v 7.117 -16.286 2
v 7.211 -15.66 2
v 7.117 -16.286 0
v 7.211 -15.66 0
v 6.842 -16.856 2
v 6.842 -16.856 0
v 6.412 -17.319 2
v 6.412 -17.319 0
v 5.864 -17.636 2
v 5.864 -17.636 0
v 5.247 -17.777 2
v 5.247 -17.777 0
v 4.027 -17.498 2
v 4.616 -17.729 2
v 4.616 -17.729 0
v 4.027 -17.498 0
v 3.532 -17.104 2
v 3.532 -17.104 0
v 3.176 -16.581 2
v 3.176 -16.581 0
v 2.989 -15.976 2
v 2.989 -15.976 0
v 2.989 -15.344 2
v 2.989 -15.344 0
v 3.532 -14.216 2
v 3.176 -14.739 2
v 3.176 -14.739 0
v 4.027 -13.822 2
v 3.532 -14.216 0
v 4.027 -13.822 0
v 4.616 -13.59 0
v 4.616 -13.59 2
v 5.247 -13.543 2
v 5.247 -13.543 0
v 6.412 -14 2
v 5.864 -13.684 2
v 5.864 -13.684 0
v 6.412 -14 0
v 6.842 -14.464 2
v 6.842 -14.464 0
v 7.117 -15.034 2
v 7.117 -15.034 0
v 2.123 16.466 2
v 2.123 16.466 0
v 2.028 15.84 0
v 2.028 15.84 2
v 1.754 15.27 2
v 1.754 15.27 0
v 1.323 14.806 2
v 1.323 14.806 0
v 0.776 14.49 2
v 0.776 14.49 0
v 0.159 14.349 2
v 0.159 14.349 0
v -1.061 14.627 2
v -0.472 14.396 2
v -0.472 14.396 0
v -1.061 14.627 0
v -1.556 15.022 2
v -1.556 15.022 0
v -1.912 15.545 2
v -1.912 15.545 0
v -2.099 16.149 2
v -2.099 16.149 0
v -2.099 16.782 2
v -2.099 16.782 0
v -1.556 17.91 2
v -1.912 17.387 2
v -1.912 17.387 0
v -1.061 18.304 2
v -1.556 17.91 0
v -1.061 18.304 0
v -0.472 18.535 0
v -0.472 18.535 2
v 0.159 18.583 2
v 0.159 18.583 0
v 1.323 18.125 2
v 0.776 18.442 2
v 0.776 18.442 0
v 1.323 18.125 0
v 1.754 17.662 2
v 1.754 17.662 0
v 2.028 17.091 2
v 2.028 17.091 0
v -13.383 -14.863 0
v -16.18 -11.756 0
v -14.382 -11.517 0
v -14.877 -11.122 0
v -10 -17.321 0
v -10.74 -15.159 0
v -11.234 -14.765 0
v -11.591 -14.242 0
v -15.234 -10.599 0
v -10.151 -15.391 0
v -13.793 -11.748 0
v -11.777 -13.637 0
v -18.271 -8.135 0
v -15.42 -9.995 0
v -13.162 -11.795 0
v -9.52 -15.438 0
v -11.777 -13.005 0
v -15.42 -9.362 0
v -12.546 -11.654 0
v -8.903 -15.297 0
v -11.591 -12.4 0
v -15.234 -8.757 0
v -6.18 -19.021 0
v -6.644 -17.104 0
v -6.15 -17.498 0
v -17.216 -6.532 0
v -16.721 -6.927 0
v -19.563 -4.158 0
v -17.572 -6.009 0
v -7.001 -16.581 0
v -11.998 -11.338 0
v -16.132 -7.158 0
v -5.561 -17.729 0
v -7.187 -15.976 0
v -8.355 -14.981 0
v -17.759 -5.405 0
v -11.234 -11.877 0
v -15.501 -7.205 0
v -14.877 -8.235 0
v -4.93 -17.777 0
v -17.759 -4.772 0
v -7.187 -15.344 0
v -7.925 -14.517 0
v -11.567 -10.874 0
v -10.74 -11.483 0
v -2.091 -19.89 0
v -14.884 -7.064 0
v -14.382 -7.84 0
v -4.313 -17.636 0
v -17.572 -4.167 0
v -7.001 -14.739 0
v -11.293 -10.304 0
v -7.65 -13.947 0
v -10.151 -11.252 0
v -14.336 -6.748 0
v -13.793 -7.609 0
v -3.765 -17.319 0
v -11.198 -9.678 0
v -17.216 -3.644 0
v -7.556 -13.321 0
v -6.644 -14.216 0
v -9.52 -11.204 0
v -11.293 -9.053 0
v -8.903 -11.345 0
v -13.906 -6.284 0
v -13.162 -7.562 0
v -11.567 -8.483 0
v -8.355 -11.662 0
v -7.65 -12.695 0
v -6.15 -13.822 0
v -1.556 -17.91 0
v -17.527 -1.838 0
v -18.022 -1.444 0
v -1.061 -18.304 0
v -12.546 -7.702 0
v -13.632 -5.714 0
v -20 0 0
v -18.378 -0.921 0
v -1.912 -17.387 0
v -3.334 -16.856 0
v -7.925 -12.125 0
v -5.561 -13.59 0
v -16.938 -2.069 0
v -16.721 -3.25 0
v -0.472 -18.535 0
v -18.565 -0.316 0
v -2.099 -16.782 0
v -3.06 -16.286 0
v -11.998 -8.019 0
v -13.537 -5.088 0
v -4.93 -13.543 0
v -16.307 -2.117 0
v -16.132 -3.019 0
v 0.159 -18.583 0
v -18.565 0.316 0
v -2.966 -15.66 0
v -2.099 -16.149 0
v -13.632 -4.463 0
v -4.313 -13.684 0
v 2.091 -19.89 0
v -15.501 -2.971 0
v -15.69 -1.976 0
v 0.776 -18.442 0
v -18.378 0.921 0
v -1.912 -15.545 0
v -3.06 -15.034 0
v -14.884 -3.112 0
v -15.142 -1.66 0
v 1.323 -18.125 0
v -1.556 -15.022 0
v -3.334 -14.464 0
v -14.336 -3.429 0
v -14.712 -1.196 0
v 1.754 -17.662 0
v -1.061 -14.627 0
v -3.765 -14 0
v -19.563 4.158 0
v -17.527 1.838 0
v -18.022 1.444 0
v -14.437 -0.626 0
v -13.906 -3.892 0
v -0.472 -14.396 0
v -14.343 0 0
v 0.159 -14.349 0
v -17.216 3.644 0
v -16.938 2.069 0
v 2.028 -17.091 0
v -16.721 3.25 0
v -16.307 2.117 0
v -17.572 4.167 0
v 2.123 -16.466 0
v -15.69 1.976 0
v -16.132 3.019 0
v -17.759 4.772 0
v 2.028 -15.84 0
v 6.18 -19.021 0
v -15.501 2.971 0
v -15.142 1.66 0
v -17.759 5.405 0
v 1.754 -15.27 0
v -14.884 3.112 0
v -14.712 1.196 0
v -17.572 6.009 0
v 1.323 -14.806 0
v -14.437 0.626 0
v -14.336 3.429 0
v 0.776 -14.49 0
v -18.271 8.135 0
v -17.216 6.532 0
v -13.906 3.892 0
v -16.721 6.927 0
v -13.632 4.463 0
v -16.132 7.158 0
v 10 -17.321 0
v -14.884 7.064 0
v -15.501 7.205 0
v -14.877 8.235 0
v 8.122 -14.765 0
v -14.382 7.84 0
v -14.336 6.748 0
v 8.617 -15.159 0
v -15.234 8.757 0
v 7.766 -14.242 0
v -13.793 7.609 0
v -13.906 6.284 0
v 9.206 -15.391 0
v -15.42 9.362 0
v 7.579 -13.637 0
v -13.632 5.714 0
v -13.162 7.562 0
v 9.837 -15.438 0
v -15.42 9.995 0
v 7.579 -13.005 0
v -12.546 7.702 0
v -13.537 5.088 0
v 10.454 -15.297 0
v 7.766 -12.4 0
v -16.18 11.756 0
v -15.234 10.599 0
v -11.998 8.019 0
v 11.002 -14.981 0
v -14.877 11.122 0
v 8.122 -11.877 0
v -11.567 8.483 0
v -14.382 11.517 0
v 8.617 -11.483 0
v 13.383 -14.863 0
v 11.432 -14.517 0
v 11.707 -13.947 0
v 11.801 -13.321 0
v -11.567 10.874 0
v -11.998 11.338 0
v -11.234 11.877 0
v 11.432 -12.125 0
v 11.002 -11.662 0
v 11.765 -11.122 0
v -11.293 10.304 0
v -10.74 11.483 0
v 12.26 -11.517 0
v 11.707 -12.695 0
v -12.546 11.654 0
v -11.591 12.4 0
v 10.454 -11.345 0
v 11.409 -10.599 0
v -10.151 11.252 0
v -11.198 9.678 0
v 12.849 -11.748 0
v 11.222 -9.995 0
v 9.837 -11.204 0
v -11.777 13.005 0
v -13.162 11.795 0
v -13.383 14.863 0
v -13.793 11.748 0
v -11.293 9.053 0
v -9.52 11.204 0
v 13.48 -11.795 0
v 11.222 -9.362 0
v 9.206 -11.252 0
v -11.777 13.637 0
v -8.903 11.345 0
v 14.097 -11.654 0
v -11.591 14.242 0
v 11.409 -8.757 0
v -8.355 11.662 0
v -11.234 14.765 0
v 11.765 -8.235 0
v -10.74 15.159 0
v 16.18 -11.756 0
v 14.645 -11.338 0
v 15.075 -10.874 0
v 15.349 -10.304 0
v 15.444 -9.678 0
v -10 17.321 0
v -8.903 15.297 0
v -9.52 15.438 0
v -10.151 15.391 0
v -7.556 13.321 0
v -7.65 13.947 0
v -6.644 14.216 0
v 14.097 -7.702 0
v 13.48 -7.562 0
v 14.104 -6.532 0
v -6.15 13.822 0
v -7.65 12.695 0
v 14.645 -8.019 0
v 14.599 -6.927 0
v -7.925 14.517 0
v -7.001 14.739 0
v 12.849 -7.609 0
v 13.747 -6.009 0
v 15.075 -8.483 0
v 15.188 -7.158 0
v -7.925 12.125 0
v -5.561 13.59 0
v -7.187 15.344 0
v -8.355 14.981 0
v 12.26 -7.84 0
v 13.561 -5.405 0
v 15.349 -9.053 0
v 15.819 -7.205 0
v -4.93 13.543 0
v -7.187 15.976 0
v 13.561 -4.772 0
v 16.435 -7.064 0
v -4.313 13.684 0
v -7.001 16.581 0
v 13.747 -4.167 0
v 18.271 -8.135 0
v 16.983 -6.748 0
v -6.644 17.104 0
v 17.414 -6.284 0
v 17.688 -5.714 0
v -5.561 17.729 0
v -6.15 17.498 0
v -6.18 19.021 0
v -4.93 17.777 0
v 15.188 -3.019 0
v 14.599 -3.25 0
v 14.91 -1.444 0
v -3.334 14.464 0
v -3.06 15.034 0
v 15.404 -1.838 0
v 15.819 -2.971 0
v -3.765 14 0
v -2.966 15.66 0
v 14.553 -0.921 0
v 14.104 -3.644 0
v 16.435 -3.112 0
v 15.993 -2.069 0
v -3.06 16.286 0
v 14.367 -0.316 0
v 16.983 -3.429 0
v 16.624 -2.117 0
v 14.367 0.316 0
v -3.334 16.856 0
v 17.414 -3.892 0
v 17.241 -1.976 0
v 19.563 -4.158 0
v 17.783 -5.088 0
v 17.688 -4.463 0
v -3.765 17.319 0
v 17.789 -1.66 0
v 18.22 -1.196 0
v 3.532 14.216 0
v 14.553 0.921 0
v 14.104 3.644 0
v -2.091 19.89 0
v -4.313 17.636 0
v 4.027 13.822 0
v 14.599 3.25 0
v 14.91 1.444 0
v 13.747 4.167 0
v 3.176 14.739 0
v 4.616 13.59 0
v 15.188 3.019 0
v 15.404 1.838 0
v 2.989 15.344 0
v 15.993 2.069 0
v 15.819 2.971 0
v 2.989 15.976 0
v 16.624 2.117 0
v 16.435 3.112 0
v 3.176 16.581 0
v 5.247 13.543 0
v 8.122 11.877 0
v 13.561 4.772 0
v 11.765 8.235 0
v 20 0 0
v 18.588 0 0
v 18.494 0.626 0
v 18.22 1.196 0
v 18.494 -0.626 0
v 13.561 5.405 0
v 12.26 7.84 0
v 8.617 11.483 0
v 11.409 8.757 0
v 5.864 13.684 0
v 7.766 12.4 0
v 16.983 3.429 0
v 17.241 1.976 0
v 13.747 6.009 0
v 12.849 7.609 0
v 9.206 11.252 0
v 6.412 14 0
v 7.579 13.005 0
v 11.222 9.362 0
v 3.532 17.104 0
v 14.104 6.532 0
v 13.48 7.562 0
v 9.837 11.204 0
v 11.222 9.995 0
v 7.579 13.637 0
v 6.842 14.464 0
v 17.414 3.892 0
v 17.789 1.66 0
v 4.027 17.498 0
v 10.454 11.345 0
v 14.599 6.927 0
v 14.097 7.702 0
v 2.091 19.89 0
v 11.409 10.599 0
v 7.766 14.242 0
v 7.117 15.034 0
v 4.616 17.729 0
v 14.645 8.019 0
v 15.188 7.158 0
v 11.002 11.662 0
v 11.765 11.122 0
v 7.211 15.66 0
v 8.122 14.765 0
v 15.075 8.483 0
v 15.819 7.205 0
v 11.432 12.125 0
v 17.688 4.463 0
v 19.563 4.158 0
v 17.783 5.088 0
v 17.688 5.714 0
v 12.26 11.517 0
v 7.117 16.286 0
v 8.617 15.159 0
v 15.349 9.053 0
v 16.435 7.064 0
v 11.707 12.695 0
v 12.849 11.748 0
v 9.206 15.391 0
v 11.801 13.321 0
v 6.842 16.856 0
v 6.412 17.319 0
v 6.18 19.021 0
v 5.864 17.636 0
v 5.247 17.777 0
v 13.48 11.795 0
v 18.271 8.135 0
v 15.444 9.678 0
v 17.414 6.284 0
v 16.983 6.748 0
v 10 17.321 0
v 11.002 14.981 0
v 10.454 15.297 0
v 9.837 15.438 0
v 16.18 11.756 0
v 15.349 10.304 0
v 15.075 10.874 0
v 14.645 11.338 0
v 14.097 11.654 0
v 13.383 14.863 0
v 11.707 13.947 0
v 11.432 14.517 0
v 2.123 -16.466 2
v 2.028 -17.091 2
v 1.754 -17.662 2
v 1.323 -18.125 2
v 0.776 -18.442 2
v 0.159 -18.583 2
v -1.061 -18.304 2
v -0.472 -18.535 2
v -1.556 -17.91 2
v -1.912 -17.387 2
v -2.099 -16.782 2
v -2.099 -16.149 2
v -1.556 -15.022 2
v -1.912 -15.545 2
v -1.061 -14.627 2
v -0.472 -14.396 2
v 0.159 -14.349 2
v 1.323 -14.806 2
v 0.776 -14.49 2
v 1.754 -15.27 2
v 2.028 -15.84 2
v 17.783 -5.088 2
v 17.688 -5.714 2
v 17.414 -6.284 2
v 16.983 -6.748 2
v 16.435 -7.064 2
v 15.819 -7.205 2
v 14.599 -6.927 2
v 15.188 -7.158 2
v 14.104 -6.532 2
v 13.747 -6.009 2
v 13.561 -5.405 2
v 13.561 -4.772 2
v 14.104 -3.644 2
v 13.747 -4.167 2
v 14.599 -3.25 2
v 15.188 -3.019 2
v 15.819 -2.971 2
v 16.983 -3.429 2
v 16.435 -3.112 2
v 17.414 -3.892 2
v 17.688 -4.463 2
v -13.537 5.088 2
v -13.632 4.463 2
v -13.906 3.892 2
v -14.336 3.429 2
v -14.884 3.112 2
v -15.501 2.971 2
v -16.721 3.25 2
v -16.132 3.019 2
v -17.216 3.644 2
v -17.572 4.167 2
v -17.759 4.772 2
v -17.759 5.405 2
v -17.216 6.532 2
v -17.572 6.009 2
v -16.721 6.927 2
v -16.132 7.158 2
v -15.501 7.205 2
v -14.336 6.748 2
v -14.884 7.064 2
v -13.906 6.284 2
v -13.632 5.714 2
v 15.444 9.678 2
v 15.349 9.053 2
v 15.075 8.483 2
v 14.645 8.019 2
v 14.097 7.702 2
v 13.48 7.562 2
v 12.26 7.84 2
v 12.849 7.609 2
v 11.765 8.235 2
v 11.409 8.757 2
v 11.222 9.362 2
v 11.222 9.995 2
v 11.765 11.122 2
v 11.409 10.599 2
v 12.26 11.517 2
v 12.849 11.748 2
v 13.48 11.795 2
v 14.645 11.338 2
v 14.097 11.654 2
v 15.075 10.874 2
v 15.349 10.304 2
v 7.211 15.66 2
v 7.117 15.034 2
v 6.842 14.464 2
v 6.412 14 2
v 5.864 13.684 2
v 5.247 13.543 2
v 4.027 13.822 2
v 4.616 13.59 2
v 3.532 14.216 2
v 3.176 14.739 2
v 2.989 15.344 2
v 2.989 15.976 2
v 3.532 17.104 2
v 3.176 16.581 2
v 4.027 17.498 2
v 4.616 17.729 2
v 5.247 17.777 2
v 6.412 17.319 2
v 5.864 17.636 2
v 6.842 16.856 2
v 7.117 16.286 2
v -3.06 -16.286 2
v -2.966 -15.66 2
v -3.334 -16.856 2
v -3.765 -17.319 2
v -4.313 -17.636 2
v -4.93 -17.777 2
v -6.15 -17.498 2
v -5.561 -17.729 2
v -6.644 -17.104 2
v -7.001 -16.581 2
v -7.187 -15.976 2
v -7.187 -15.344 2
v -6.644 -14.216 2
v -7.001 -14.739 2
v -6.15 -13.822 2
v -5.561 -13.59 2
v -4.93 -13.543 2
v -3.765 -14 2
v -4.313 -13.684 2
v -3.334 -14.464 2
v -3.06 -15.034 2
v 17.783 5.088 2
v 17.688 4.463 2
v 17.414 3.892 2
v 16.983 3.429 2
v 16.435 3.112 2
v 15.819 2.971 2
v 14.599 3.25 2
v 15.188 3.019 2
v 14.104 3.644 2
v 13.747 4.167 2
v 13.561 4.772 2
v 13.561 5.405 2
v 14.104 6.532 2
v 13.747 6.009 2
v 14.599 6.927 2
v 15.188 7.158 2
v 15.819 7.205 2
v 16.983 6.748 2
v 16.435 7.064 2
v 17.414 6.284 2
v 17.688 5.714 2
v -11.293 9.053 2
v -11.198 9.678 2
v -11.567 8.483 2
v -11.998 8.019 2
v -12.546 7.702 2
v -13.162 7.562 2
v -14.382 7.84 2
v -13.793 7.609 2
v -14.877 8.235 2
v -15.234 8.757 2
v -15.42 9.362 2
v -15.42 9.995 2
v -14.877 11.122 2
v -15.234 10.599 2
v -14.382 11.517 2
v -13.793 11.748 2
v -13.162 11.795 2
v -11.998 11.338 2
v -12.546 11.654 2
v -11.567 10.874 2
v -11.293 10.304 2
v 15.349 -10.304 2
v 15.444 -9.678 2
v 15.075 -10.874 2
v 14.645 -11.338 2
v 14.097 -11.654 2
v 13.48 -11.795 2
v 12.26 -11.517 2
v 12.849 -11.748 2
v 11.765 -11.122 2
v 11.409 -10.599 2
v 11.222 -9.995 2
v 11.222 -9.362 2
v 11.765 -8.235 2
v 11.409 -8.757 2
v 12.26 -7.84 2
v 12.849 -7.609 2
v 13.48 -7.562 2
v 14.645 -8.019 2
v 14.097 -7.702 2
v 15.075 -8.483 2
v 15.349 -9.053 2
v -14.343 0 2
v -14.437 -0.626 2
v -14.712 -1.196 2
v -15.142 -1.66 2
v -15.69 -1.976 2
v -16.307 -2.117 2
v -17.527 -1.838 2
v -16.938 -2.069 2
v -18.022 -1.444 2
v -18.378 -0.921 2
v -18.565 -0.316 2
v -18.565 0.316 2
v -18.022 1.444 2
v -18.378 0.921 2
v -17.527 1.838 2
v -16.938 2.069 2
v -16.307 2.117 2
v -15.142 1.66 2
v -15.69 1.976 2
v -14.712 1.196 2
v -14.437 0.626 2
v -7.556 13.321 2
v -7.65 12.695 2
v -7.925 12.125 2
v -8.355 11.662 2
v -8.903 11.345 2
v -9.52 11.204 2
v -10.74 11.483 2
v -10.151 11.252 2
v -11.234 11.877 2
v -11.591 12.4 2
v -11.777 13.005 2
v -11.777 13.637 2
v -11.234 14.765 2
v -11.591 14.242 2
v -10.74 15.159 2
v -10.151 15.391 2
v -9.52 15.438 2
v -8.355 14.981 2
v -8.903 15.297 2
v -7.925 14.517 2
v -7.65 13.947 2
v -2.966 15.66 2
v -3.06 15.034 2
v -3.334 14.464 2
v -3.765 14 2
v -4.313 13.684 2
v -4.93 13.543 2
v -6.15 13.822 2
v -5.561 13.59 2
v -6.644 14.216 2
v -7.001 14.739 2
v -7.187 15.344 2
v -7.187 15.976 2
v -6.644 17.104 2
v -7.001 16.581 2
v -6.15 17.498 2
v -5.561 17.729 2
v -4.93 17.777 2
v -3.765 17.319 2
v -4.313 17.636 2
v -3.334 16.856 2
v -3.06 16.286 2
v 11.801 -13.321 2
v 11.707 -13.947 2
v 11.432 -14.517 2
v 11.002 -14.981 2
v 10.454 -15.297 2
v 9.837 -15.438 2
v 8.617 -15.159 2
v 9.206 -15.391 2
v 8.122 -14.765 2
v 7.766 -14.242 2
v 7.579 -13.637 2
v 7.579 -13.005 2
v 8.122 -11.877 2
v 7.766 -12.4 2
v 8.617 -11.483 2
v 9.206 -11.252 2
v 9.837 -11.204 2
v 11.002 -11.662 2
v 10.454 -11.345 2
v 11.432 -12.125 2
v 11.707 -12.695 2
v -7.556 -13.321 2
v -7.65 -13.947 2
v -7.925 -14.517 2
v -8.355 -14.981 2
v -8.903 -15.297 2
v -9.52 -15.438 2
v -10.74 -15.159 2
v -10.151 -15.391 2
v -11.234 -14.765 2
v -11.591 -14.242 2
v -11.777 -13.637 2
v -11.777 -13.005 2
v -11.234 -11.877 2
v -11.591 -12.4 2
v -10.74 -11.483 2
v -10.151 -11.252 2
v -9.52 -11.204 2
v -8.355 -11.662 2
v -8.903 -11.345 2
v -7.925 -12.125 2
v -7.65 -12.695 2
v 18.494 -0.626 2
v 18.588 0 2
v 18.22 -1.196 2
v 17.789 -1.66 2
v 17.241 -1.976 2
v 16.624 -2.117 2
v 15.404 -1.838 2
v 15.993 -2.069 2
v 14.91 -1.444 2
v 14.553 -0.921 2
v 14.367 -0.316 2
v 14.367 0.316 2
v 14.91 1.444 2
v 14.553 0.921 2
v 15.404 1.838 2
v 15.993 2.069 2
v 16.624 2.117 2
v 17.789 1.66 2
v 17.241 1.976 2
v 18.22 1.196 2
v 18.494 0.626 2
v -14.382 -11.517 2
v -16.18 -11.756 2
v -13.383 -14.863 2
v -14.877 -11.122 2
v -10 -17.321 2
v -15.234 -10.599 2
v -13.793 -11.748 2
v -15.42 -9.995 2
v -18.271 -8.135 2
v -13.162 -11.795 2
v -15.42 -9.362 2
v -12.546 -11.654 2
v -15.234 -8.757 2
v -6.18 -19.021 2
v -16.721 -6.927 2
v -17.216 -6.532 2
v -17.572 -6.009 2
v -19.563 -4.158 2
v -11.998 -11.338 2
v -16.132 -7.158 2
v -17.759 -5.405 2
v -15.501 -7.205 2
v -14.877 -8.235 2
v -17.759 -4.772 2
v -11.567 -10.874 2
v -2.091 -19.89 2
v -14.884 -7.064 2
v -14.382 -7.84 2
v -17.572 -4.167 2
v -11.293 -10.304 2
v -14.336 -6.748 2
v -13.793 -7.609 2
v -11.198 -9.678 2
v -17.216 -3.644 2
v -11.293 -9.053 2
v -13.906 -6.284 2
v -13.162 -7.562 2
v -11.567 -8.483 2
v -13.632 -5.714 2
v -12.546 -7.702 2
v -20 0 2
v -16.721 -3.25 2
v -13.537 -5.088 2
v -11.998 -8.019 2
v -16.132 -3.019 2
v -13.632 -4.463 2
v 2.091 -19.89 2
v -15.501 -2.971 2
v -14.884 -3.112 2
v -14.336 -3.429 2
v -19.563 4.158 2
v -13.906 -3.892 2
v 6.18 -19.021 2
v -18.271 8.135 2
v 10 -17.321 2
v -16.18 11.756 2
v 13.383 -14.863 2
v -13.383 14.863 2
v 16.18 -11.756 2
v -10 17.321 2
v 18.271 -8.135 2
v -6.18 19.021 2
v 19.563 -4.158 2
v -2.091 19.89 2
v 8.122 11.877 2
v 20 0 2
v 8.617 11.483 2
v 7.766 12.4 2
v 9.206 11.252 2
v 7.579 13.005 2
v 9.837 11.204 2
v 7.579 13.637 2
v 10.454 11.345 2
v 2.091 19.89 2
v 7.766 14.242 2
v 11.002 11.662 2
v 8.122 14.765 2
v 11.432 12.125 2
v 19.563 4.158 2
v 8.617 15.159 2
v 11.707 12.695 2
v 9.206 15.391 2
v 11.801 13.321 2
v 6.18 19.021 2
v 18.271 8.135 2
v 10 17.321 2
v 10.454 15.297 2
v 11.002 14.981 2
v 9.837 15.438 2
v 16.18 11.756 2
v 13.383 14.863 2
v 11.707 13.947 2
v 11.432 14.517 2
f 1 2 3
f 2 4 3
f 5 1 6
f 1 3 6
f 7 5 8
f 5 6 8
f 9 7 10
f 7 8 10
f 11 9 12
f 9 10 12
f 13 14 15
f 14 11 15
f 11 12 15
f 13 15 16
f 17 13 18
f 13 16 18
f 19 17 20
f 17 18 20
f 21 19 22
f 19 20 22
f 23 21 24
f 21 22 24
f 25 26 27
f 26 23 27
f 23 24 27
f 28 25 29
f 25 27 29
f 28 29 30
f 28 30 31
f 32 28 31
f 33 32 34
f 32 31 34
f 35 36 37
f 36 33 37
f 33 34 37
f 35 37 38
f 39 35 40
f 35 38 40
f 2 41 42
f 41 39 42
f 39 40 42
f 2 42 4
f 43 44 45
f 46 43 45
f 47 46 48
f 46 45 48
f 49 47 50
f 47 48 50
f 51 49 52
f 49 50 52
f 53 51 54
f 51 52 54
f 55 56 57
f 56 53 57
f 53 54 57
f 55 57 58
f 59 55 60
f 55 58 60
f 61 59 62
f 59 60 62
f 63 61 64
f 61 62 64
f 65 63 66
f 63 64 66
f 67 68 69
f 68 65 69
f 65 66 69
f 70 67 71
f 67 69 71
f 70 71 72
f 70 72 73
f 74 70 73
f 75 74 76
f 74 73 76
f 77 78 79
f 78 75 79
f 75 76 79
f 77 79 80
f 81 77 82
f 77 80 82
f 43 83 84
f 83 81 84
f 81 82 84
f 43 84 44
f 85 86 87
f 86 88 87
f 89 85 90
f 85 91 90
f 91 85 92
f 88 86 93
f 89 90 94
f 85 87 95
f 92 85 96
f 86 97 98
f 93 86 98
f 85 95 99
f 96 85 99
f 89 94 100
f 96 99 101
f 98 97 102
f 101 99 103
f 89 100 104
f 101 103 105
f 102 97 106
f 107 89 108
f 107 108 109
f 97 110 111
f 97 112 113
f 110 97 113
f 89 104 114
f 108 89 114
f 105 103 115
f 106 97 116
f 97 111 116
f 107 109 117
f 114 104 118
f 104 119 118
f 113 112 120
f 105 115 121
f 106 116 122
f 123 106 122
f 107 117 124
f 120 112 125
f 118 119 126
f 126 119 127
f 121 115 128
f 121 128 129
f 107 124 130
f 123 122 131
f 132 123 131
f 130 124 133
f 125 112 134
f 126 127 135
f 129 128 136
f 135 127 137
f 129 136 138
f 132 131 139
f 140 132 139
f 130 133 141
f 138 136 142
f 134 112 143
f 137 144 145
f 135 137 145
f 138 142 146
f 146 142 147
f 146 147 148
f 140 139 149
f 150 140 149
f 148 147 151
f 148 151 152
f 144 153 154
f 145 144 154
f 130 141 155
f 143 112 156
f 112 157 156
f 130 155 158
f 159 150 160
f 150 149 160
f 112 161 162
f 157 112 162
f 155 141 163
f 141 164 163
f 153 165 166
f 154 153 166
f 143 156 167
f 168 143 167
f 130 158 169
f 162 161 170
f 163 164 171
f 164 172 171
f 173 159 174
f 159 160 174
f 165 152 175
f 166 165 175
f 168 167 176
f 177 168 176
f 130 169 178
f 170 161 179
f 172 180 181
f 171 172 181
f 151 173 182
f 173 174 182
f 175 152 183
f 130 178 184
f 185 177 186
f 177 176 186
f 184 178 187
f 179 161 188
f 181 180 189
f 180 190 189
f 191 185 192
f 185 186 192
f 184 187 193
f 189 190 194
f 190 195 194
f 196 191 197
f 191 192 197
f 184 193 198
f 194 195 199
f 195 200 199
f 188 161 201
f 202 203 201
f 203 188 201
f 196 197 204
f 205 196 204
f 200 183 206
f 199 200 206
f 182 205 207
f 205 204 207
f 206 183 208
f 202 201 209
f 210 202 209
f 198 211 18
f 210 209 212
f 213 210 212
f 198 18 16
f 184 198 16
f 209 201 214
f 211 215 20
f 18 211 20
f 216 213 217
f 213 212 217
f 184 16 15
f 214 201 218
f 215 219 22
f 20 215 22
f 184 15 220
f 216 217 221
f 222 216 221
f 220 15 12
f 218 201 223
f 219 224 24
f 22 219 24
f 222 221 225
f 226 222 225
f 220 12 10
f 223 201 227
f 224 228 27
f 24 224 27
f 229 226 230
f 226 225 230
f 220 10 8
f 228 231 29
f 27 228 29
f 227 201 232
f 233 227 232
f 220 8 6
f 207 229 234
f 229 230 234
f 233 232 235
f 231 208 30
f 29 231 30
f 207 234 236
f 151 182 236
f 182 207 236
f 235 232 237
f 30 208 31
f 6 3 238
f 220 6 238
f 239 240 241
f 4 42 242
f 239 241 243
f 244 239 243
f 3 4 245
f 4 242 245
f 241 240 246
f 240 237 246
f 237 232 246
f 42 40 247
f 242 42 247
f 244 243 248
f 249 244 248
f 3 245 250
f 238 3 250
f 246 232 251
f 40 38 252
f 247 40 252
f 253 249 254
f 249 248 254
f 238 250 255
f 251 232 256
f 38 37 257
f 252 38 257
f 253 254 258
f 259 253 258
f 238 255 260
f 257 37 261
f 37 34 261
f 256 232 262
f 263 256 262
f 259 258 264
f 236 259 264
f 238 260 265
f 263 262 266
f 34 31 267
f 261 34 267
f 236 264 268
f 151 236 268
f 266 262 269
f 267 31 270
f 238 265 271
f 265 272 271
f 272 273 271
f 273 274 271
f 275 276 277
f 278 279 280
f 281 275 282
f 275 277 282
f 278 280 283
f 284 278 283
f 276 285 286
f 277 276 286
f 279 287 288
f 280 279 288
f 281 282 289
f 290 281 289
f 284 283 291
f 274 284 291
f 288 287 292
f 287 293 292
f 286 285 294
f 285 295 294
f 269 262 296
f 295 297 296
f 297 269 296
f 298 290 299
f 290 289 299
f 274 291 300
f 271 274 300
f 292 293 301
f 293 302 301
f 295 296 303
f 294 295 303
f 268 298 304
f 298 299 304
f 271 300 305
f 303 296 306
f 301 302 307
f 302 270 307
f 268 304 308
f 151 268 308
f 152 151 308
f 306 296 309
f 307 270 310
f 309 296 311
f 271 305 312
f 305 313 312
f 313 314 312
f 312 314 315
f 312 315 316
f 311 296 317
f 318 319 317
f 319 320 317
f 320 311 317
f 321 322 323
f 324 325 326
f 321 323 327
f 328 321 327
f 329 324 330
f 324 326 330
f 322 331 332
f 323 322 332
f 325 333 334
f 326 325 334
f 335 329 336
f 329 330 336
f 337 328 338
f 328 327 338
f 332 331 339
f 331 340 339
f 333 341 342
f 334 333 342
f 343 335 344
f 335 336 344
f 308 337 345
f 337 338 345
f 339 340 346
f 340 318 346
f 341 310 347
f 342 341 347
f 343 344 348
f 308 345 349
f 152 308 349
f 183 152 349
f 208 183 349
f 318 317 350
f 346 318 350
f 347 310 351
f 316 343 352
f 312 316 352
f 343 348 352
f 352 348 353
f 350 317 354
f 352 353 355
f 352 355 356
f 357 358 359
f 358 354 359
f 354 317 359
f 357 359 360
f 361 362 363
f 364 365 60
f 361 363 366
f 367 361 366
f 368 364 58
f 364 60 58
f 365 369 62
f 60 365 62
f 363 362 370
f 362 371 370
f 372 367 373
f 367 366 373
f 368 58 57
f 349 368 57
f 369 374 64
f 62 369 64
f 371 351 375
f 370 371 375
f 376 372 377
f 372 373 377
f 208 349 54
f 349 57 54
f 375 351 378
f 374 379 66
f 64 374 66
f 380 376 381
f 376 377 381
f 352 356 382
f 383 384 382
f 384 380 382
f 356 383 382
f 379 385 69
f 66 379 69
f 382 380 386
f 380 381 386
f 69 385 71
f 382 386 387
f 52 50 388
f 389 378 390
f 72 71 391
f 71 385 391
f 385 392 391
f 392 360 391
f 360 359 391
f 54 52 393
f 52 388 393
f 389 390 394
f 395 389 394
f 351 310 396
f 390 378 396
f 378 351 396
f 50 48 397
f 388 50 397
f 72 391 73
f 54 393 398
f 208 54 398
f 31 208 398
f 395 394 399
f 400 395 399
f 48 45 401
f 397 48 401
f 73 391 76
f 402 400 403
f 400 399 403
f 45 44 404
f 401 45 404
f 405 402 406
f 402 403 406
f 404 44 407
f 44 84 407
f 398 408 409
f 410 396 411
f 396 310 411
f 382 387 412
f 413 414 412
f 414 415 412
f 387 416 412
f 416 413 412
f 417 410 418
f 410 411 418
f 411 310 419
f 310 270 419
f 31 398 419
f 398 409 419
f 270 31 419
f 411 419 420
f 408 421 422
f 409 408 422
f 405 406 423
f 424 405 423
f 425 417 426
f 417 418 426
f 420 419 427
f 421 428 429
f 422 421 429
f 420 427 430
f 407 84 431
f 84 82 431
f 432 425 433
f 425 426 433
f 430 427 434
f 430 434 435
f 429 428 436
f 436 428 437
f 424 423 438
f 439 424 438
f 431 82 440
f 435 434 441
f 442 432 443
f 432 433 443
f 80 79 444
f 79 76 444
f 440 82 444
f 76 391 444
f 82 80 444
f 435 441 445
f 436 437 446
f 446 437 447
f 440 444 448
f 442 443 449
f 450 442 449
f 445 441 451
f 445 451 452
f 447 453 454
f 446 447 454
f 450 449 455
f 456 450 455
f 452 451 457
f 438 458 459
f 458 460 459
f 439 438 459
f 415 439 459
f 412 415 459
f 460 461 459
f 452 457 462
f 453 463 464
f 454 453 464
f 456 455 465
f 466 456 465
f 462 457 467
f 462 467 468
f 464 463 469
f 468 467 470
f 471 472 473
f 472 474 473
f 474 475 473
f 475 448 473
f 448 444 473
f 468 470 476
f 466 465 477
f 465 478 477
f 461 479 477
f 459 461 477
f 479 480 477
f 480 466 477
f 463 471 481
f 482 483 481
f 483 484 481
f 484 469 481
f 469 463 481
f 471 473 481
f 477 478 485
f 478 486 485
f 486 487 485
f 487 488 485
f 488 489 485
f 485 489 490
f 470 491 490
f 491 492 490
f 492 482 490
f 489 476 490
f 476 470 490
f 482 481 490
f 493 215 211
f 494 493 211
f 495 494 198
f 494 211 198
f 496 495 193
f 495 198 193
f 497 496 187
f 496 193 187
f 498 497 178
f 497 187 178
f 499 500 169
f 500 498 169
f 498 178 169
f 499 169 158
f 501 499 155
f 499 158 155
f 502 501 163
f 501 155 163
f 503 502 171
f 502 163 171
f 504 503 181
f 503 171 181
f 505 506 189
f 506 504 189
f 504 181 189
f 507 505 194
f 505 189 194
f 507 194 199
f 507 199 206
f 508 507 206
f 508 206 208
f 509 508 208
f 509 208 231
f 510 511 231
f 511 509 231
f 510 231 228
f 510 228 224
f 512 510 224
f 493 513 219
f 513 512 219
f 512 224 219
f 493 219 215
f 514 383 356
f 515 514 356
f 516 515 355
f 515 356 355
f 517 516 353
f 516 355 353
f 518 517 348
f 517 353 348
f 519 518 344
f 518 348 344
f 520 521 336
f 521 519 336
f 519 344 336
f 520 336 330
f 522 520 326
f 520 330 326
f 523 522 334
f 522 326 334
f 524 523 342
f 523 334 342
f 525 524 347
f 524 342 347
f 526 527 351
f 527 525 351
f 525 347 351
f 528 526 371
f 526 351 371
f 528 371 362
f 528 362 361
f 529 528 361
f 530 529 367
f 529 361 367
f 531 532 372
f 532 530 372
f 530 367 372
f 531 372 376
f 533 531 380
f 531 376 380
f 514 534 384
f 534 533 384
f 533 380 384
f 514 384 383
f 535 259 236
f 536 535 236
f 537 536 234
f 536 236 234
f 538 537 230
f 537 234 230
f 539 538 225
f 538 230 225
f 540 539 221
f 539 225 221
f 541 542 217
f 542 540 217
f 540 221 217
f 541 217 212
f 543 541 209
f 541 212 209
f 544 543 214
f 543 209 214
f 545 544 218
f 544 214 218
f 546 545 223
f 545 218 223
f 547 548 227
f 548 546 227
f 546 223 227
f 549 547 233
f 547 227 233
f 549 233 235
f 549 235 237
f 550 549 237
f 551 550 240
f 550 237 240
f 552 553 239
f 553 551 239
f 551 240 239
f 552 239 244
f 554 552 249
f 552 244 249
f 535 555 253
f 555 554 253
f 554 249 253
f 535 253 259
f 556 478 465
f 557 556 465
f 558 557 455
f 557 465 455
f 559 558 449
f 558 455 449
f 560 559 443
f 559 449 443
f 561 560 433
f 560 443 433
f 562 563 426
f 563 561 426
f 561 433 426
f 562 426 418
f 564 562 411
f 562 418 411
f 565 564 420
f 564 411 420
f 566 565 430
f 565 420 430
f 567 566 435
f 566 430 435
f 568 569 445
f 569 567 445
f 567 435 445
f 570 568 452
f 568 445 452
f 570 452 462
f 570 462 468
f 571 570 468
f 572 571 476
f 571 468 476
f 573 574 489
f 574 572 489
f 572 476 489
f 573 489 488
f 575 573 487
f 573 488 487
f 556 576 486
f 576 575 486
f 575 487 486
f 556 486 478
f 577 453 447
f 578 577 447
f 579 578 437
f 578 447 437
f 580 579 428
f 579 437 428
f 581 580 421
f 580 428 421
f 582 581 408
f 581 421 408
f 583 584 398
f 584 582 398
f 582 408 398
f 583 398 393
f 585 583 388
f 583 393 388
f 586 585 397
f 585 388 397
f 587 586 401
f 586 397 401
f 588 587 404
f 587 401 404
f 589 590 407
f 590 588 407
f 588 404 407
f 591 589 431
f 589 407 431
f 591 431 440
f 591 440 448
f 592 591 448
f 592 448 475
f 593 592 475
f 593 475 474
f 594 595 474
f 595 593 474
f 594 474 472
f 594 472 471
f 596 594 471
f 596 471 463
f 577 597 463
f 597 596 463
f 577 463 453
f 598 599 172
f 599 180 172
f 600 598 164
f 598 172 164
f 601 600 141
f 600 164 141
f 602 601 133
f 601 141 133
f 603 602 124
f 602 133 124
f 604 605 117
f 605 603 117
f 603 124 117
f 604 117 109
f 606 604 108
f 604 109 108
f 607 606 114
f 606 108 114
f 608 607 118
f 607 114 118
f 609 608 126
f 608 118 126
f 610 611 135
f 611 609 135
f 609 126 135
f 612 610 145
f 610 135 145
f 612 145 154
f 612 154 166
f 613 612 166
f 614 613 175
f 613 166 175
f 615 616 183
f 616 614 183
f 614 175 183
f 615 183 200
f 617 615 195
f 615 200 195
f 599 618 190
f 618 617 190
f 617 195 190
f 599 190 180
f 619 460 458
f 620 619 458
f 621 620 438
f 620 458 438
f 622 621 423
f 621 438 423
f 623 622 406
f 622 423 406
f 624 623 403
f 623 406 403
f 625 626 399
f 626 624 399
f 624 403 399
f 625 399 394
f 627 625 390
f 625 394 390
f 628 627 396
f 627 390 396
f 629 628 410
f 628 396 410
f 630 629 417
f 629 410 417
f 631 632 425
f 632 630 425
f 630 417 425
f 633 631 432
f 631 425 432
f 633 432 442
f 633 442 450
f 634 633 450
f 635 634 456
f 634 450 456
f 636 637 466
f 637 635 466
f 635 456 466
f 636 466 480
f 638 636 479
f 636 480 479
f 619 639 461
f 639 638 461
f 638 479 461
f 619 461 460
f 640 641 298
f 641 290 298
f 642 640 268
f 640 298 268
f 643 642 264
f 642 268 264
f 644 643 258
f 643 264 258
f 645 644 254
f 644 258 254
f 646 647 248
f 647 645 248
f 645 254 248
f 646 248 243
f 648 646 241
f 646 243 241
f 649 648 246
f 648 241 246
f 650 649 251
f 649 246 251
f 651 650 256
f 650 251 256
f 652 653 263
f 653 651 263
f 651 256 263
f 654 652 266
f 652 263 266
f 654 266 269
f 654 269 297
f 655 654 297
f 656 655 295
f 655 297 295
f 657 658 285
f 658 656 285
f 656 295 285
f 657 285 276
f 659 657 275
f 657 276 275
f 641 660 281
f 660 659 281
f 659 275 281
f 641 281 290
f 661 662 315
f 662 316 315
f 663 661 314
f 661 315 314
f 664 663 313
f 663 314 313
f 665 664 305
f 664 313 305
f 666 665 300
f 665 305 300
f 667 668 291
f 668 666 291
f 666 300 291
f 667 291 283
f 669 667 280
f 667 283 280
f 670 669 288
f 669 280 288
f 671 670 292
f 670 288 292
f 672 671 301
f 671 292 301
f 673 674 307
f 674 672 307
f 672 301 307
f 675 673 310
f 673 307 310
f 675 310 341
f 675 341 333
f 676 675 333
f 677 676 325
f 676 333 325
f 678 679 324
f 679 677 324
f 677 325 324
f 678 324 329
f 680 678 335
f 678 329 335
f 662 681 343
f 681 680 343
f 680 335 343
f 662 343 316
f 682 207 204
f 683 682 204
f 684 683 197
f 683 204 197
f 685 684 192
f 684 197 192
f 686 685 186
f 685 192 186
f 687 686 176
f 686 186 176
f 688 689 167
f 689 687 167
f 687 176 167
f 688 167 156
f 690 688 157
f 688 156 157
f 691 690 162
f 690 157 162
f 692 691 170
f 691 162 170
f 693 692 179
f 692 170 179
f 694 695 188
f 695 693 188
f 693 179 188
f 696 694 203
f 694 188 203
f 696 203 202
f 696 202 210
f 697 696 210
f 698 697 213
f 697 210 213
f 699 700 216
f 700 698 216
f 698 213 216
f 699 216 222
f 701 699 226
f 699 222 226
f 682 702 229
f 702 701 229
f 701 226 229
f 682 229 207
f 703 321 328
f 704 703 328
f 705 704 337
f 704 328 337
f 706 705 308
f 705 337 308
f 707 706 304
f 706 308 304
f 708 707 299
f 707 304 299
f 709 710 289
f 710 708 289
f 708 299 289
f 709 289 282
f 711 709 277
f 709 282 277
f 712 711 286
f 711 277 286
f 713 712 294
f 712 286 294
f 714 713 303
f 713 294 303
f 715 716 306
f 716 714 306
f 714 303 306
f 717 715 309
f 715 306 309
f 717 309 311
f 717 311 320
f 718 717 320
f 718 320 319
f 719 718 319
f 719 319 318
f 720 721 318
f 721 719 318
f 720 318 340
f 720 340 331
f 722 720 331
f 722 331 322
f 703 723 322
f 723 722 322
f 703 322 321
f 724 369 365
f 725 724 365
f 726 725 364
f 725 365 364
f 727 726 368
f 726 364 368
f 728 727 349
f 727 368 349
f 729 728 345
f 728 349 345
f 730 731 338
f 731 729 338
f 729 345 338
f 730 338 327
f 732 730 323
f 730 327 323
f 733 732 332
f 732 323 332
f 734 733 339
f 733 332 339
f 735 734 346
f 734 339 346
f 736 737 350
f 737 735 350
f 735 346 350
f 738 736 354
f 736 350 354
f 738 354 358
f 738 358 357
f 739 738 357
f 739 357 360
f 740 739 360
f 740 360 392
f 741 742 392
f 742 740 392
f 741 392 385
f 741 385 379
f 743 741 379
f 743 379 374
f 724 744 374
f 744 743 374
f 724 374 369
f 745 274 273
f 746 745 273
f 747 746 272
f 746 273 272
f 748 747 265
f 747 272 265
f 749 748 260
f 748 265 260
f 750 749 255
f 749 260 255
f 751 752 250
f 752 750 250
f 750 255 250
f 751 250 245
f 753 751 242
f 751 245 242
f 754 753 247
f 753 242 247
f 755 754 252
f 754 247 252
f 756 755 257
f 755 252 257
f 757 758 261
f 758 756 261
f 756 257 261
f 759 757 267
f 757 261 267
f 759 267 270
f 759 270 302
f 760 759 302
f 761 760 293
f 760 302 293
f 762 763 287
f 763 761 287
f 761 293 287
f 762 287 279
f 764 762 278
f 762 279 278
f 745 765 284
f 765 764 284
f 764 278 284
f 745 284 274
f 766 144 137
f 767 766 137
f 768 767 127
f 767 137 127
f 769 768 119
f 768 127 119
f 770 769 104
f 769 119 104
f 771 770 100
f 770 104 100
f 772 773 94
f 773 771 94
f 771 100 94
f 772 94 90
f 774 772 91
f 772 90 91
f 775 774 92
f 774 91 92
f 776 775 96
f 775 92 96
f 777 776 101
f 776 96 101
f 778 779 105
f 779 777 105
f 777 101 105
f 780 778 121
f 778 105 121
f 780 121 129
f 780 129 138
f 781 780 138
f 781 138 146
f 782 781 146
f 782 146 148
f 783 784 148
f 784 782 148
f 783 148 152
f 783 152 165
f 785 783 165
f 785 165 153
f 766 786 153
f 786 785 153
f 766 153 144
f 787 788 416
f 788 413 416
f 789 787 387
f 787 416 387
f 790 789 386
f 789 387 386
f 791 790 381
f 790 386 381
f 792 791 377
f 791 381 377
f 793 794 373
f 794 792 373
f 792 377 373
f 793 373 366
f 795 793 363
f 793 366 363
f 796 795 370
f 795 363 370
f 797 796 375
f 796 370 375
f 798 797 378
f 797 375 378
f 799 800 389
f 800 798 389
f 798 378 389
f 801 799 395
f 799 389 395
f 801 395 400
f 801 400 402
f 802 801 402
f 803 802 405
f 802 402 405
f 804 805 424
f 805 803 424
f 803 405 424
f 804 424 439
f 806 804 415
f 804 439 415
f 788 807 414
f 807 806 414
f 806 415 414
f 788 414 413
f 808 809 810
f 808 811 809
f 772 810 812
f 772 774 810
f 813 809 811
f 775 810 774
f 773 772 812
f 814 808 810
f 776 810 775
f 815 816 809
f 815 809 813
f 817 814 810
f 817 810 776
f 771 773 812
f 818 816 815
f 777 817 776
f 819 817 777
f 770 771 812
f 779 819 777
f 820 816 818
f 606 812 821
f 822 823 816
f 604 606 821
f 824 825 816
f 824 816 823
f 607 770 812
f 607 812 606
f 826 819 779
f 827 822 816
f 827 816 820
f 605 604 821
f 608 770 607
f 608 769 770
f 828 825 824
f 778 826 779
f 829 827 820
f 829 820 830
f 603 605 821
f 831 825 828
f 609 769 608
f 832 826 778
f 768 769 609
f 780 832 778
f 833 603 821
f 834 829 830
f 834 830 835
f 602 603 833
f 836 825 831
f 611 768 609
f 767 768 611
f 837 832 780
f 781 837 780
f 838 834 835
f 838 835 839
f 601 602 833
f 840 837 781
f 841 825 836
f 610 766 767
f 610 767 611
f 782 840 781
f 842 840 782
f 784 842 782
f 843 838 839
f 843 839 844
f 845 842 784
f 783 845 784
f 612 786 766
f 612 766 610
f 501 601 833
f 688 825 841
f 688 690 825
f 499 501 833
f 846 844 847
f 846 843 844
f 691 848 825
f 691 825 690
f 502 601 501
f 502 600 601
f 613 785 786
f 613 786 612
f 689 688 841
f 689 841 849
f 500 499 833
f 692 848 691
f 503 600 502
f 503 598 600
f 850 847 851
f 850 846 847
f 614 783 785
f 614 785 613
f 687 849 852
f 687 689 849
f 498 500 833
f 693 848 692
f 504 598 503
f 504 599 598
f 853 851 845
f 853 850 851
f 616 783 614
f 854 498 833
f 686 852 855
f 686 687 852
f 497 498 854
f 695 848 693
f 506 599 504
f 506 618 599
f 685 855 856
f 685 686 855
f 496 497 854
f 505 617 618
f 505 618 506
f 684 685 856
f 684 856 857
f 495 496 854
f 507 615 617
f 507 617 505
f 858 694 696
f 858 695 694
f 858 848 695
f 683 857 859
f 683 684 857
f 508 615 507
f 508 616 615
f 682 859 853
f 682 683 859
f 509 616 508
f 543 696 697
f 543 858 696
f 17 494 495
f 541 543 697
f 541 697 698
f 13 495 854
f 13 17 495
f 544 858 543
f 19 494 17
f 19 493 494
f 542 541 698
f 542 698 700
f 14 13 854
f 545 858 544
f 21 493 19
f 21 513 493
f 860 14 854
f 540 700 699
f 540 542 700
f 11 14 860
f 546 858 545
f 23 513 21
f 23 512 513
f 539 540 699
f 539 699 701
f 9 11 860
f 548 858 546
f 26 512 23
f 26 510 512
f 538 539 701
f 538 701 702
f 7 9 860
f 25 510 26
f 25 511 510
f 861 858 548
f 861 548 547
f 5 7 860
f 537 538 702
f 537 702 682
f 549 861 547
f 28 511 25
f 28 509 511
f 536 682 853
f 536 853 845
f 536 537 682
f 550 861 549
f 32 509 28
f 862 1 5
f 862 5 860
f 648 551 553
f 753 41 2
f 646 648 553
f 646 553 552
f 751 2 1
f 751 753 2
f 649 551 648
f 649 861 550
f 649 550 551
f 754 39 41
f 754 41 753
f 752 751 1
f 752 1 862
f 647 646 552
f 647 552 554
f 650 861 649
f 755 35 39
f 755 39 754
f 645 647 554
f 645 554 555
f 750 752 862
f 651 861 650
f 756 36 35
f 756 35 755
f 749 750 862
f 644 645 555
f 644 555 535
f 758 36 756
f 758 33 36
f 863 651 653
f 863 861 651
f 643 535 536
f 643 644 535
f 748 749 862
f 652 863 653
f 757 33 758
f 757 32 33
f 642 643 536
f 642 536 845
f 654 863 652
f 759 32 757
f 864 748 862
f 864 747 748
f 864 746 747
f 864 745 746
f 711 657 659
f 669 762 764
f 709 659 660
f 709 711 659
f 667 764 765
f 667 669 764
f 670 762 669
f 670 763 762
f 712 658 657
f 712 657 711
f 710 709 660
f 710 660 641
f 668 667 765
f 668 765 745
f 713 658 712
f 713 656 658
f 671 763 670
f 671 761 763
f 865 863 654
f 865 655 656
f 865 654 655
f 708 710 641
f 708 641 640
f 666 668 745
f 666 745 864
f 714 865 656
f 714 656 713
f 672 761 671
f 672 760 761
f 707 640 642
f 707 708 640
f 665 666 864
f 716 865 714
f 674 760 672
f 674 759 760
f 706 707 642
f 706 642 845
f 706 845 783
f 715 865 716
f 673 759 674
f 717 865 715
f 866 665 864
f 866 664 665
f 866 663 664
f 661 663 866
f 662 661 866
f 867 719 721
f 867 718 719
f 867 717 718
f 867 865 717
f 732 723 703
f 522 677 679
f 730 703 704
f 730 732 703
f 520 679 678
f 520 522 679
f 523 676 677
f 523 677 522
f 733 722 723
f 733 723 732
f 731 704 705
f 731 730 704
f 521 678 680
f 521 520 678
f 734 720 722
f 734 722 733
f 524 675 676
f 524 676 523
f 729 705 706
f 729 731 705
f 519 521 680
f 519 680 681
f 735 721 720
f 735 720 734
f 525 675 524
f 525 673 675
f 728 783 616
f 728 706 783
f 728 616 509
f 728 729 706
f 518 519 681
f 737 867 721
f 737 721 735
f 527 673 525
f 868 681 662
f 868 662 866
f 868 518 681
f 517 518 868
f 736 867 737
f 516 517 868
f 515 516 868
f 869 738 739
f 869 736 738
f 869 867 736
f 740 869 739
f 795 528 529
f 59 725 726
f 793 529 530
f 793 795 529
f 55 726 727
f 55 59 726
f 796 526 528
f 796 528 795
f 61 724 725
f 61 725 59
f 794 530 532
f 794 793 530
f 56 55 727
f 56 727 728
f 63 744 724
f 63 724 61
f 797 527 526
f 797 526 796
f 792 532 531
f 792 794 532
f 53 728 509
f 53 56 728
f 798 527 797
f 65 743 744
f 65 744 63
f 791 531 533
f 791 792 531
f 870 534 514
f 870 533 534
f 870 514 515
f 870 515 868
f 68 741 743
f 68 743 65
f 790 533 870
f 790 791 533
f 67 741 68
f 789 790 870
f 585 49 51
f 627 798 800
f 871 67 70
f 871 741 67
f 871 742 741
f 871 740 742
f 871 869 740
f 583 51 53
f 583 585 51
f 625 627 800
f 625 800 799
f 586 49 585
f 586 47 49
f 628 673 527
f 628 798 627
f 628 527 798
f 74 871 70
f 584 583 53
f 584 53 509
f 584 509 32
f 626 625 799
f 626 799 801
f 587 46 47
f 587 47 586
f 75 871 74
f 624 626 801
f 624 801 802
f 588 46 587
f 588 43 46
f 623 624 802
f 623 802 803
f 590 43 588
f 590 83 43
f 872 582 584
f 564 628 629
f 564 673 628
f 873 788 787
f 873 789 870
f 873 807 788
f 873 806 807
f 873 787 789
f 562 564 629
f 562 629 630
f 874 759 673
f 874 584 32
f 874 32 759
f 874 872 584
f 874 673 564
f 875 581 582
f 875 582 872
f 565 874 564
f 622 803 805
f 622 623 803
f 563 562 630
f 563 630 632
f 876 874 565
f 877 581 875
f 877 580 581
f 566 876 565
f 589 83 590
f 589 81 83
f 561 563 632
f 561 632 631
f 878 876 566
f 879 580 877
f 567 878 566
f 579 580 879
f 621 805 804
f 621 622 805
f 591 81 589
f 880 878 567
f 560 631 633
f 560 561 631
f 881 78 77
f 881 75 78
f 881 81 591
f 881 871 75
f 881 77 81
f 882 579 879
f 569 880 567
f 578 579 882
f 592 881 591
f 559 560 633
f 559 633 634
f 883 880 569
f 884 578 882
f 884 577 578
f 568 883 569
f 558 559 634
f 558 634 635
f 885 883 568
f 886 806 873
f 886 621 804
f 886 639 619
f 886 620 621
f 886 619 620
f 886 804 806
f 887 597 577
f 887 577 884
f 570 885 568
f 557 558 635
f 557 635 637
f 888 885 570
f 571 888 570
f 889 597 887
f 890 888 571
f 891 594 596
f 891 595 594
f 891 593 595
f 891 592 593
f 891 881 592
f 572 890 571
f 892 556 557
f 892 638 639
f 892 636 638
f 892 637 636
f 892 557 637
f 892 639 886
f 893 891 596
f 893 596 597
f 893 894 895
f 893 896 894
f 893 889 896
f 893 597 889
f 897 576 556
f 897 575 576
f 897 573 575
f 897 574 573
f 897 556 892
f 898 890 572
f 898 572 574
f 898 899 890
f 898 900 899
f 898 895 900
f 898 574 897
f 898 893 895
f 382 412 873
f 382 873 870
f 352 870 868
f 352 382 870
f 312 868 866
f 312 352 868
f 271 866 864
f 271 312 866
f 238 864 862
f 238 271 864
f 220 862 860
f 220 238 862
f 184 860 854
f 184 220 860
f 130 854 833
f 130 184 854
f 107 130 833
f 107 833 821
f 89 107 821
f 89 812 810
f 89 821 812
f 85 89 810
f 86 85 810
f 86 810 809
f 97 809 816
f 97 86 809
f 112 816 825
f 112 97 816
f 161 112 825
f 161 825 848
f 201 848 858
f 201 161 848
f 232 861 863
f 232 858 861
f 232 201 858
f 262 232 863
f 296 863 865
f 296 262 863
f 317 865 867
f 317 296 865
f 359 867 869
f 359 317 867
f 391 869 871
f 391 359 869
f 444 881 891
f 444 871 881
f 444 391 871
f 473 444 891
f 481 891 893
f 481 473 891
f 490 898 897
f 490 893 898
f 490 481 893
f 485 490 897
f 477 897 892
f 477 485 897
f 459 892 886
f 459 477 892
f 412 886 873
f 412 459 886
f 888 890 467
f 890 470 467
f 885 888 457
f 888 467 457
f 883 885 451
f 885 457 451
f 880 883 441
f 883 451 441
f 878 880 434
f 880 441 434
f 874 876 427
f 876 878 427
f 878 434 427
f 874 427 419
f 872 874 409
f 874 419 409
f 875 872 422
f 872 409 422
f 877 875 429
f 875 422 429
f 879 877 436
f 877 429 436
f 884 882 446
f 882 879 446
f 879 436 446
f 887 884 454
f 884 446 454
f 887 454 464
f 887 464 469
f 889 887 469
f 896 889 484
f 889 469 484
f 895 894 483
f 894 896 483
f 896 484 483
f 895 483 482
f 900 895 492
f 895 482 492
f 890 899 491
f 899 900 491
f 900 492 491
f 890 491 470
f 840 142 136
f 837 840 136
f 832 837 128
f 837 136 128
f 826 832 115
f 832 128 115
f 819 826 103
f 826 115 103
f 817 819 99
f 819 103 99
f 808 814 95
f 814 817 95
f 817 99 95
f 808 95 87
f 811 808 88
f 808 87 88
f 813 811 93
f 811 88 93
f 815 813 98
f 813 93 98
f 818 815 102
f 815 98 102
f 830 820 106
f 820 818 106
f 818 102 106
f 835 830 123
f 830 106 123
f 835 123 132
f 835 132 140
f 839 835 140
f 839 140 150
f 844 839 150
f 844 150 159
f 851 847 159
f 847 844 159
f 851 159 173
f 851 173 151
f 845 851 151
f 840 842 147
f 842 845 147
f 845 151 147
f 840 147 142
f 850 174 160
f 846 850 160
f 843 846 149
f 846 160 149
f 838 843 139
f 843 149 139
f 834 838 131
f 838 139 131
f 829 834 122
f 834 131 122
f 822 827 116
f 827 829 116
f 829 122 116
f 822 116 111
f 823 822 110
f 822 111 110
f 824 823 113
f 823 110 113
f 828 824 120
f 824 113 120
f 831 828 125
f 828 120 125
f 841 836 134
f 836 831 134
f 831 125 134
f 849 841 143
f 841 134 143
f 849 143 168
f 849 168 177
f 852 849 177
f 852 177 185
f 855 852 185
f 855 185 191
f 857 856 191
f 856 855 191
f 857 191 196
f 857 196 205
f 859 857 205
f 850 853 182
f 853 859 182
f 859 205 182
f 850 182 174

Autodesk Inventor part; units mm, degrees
ref_plane "YZ Plane" through (0, 0, 0) normal (1, 0, 0) x (0, 1, 0)
ref_plane "XZ Plane" through (0, 0, 0) normal (0, 1, 0) x (-1, 0, 0)
ref_plane "XY Plane" through (0, 0, 0) normal (0, 0, 1) x (1, 0, 0)
sketch "Skizze1" plane through (0, 0, 0) normal (0, 0, 1) x (1, 0, 0)
  circle A0 centre (0, 0) radius 20
  circle A1 centre (0, 16.4658) radius 2.1227
  circle A2 centre (-5.0882, 15.6599) radius 2.1227
  circle A3 centre (-9.6784, 13.3211) radius 2.1227
  circle A4 centre (-13.3211, 9.6784) radius 2.1227
  circle A5 centre (-15.6599, 5.0882) radius 2.1227
  circle A6 centre (-16.4658, 0) radius 2.1227
  circle A7 centre (-15.6599, -5.0882) radius 2.1227
  circle A8 centre (-13.3211, -9.6784) radius 2.1227
  circle A9 centre (-9.6784, -13.3211) radius 2.1227
  circle A10 centre (-5.0882, -15.6599) radius 2.1227
  circle A11 centre (0, -16.4658) radius 2.1227
  circle A12 centre (5.0882, -15.6599) radius 2.1227
  circle A13 centre (9.6784, -13.3211) radius 2.1227
  circle A14 centre (13.3211, -9.6784) radius 2.1227
  circle A15 centre (15.6599, -5.0882) radius 2.1227
  circle A16 centre (16.4658, 0) radius 2.1227
  circle A17 centre (15.6599, 5.0882) radius 2.1227
  circle A18 centre (13.3211, 9.6784) radius 2.1227
  circle A19 centre (9.6784, 13.3211) radius 2.1227
  circle A20 centre (5.0882, 15.6599) radius 2.1227
  dimension "d0" = 40
  dimension "d3" = 360
extrude "Extrusion1" add sketch "Skizze1" along normal blind 2
properties part number "EncoderWheel"
